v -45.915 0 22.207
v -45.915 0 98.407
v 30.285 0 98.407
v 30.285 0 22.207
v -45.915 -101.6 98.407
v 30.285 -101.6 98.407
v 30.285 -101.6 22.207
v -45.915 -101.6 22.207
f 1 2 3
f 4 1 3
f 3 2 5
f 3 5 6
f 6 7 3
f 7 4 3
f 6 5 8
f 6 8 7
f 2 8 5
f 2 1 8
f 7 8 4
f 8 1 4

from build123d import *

# Parameters (mm, degrees)
F0_W      = 76.2
F0_H      = 76.2
F1_DEPTH  = 76.2
F2_W      = 76.2
F2_H      = 76.2
F2_W_2    = 25.4
F2_H_2    = 25.4
F3_DEPTH  = 12.7
F3_FACE_W = 76.2
F3_FACE_H = 76.2
F4_DEPTH  = 12.7


with BuildPart() as f1:
    # F0 (on Front) → F1 (new body)
    with BuildSketch(Plane.XZ):
        with Locations((-7.8149551065, 60.3069368094)):
            Rectangle(F0_W, F0_H)
    extrude(amount=F1_DEPTH)

    # F2 (on face) → F3 (join)
    with BuildSketch(Plane.XZ.offset(76.2)):
        with Locations((-7.8149551065, 60.3069368094)):
            Rectangle(F2_W, F2_H)
        with Locations((-16.3421141915, 65.2924486793)):
            Rectangle(F2_W_2, F2_H_2, mode=Mode.SUBTRACT)
        with Locations((-16.3421141915, 65.2924486793)):
            Rectangle(F2_W_2, F2_H_2)
    extrude(amount=F3_DEPTH)

    # F2 (on face) + F3_face (on face) → F4 (join)
    with BuildSketch(Plane.XZ.offset(76.2)):
        with Locations((-16.3421141915, 65.2924486793)):
            Rectangle(F2_W_2, F2_H_2)
    with BuildSketch(Plane(origin=(-7.8149551065, -88.9, 60.3069368094), x_dir=(1, 0, 0), z_dir=(0, -1, 0))):
        Rectangle(F3_FACE_W, F3_FACE_H)
    extrude(amount=F4_DEPTH)


solid = f1.part
